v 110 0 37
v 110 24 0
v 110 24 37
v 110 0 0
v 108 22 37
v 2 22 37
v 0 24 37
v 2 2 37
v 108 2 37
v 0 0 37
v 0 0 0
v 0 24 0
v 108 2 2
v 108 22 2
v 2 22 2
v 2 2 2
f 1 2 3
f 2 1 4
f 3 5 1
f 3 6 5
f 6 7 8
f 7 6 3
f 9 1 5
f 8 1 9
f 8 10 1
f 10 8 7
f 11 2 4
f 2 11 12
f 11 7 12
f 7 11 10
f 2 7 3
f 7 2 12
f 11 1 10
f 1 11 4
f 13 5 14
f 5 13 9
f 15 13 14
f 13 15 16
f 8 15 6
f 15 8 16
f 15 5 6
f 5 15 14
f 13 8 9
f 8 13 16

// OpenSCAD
a=20;
b=106;
c=74;

t=2;

difference()
{
color("red")
translate([0,0,0])
cube([b+t+t,a+t+t,c/2]);

translate([t,t,t])
cube([b,a,c]);
}
